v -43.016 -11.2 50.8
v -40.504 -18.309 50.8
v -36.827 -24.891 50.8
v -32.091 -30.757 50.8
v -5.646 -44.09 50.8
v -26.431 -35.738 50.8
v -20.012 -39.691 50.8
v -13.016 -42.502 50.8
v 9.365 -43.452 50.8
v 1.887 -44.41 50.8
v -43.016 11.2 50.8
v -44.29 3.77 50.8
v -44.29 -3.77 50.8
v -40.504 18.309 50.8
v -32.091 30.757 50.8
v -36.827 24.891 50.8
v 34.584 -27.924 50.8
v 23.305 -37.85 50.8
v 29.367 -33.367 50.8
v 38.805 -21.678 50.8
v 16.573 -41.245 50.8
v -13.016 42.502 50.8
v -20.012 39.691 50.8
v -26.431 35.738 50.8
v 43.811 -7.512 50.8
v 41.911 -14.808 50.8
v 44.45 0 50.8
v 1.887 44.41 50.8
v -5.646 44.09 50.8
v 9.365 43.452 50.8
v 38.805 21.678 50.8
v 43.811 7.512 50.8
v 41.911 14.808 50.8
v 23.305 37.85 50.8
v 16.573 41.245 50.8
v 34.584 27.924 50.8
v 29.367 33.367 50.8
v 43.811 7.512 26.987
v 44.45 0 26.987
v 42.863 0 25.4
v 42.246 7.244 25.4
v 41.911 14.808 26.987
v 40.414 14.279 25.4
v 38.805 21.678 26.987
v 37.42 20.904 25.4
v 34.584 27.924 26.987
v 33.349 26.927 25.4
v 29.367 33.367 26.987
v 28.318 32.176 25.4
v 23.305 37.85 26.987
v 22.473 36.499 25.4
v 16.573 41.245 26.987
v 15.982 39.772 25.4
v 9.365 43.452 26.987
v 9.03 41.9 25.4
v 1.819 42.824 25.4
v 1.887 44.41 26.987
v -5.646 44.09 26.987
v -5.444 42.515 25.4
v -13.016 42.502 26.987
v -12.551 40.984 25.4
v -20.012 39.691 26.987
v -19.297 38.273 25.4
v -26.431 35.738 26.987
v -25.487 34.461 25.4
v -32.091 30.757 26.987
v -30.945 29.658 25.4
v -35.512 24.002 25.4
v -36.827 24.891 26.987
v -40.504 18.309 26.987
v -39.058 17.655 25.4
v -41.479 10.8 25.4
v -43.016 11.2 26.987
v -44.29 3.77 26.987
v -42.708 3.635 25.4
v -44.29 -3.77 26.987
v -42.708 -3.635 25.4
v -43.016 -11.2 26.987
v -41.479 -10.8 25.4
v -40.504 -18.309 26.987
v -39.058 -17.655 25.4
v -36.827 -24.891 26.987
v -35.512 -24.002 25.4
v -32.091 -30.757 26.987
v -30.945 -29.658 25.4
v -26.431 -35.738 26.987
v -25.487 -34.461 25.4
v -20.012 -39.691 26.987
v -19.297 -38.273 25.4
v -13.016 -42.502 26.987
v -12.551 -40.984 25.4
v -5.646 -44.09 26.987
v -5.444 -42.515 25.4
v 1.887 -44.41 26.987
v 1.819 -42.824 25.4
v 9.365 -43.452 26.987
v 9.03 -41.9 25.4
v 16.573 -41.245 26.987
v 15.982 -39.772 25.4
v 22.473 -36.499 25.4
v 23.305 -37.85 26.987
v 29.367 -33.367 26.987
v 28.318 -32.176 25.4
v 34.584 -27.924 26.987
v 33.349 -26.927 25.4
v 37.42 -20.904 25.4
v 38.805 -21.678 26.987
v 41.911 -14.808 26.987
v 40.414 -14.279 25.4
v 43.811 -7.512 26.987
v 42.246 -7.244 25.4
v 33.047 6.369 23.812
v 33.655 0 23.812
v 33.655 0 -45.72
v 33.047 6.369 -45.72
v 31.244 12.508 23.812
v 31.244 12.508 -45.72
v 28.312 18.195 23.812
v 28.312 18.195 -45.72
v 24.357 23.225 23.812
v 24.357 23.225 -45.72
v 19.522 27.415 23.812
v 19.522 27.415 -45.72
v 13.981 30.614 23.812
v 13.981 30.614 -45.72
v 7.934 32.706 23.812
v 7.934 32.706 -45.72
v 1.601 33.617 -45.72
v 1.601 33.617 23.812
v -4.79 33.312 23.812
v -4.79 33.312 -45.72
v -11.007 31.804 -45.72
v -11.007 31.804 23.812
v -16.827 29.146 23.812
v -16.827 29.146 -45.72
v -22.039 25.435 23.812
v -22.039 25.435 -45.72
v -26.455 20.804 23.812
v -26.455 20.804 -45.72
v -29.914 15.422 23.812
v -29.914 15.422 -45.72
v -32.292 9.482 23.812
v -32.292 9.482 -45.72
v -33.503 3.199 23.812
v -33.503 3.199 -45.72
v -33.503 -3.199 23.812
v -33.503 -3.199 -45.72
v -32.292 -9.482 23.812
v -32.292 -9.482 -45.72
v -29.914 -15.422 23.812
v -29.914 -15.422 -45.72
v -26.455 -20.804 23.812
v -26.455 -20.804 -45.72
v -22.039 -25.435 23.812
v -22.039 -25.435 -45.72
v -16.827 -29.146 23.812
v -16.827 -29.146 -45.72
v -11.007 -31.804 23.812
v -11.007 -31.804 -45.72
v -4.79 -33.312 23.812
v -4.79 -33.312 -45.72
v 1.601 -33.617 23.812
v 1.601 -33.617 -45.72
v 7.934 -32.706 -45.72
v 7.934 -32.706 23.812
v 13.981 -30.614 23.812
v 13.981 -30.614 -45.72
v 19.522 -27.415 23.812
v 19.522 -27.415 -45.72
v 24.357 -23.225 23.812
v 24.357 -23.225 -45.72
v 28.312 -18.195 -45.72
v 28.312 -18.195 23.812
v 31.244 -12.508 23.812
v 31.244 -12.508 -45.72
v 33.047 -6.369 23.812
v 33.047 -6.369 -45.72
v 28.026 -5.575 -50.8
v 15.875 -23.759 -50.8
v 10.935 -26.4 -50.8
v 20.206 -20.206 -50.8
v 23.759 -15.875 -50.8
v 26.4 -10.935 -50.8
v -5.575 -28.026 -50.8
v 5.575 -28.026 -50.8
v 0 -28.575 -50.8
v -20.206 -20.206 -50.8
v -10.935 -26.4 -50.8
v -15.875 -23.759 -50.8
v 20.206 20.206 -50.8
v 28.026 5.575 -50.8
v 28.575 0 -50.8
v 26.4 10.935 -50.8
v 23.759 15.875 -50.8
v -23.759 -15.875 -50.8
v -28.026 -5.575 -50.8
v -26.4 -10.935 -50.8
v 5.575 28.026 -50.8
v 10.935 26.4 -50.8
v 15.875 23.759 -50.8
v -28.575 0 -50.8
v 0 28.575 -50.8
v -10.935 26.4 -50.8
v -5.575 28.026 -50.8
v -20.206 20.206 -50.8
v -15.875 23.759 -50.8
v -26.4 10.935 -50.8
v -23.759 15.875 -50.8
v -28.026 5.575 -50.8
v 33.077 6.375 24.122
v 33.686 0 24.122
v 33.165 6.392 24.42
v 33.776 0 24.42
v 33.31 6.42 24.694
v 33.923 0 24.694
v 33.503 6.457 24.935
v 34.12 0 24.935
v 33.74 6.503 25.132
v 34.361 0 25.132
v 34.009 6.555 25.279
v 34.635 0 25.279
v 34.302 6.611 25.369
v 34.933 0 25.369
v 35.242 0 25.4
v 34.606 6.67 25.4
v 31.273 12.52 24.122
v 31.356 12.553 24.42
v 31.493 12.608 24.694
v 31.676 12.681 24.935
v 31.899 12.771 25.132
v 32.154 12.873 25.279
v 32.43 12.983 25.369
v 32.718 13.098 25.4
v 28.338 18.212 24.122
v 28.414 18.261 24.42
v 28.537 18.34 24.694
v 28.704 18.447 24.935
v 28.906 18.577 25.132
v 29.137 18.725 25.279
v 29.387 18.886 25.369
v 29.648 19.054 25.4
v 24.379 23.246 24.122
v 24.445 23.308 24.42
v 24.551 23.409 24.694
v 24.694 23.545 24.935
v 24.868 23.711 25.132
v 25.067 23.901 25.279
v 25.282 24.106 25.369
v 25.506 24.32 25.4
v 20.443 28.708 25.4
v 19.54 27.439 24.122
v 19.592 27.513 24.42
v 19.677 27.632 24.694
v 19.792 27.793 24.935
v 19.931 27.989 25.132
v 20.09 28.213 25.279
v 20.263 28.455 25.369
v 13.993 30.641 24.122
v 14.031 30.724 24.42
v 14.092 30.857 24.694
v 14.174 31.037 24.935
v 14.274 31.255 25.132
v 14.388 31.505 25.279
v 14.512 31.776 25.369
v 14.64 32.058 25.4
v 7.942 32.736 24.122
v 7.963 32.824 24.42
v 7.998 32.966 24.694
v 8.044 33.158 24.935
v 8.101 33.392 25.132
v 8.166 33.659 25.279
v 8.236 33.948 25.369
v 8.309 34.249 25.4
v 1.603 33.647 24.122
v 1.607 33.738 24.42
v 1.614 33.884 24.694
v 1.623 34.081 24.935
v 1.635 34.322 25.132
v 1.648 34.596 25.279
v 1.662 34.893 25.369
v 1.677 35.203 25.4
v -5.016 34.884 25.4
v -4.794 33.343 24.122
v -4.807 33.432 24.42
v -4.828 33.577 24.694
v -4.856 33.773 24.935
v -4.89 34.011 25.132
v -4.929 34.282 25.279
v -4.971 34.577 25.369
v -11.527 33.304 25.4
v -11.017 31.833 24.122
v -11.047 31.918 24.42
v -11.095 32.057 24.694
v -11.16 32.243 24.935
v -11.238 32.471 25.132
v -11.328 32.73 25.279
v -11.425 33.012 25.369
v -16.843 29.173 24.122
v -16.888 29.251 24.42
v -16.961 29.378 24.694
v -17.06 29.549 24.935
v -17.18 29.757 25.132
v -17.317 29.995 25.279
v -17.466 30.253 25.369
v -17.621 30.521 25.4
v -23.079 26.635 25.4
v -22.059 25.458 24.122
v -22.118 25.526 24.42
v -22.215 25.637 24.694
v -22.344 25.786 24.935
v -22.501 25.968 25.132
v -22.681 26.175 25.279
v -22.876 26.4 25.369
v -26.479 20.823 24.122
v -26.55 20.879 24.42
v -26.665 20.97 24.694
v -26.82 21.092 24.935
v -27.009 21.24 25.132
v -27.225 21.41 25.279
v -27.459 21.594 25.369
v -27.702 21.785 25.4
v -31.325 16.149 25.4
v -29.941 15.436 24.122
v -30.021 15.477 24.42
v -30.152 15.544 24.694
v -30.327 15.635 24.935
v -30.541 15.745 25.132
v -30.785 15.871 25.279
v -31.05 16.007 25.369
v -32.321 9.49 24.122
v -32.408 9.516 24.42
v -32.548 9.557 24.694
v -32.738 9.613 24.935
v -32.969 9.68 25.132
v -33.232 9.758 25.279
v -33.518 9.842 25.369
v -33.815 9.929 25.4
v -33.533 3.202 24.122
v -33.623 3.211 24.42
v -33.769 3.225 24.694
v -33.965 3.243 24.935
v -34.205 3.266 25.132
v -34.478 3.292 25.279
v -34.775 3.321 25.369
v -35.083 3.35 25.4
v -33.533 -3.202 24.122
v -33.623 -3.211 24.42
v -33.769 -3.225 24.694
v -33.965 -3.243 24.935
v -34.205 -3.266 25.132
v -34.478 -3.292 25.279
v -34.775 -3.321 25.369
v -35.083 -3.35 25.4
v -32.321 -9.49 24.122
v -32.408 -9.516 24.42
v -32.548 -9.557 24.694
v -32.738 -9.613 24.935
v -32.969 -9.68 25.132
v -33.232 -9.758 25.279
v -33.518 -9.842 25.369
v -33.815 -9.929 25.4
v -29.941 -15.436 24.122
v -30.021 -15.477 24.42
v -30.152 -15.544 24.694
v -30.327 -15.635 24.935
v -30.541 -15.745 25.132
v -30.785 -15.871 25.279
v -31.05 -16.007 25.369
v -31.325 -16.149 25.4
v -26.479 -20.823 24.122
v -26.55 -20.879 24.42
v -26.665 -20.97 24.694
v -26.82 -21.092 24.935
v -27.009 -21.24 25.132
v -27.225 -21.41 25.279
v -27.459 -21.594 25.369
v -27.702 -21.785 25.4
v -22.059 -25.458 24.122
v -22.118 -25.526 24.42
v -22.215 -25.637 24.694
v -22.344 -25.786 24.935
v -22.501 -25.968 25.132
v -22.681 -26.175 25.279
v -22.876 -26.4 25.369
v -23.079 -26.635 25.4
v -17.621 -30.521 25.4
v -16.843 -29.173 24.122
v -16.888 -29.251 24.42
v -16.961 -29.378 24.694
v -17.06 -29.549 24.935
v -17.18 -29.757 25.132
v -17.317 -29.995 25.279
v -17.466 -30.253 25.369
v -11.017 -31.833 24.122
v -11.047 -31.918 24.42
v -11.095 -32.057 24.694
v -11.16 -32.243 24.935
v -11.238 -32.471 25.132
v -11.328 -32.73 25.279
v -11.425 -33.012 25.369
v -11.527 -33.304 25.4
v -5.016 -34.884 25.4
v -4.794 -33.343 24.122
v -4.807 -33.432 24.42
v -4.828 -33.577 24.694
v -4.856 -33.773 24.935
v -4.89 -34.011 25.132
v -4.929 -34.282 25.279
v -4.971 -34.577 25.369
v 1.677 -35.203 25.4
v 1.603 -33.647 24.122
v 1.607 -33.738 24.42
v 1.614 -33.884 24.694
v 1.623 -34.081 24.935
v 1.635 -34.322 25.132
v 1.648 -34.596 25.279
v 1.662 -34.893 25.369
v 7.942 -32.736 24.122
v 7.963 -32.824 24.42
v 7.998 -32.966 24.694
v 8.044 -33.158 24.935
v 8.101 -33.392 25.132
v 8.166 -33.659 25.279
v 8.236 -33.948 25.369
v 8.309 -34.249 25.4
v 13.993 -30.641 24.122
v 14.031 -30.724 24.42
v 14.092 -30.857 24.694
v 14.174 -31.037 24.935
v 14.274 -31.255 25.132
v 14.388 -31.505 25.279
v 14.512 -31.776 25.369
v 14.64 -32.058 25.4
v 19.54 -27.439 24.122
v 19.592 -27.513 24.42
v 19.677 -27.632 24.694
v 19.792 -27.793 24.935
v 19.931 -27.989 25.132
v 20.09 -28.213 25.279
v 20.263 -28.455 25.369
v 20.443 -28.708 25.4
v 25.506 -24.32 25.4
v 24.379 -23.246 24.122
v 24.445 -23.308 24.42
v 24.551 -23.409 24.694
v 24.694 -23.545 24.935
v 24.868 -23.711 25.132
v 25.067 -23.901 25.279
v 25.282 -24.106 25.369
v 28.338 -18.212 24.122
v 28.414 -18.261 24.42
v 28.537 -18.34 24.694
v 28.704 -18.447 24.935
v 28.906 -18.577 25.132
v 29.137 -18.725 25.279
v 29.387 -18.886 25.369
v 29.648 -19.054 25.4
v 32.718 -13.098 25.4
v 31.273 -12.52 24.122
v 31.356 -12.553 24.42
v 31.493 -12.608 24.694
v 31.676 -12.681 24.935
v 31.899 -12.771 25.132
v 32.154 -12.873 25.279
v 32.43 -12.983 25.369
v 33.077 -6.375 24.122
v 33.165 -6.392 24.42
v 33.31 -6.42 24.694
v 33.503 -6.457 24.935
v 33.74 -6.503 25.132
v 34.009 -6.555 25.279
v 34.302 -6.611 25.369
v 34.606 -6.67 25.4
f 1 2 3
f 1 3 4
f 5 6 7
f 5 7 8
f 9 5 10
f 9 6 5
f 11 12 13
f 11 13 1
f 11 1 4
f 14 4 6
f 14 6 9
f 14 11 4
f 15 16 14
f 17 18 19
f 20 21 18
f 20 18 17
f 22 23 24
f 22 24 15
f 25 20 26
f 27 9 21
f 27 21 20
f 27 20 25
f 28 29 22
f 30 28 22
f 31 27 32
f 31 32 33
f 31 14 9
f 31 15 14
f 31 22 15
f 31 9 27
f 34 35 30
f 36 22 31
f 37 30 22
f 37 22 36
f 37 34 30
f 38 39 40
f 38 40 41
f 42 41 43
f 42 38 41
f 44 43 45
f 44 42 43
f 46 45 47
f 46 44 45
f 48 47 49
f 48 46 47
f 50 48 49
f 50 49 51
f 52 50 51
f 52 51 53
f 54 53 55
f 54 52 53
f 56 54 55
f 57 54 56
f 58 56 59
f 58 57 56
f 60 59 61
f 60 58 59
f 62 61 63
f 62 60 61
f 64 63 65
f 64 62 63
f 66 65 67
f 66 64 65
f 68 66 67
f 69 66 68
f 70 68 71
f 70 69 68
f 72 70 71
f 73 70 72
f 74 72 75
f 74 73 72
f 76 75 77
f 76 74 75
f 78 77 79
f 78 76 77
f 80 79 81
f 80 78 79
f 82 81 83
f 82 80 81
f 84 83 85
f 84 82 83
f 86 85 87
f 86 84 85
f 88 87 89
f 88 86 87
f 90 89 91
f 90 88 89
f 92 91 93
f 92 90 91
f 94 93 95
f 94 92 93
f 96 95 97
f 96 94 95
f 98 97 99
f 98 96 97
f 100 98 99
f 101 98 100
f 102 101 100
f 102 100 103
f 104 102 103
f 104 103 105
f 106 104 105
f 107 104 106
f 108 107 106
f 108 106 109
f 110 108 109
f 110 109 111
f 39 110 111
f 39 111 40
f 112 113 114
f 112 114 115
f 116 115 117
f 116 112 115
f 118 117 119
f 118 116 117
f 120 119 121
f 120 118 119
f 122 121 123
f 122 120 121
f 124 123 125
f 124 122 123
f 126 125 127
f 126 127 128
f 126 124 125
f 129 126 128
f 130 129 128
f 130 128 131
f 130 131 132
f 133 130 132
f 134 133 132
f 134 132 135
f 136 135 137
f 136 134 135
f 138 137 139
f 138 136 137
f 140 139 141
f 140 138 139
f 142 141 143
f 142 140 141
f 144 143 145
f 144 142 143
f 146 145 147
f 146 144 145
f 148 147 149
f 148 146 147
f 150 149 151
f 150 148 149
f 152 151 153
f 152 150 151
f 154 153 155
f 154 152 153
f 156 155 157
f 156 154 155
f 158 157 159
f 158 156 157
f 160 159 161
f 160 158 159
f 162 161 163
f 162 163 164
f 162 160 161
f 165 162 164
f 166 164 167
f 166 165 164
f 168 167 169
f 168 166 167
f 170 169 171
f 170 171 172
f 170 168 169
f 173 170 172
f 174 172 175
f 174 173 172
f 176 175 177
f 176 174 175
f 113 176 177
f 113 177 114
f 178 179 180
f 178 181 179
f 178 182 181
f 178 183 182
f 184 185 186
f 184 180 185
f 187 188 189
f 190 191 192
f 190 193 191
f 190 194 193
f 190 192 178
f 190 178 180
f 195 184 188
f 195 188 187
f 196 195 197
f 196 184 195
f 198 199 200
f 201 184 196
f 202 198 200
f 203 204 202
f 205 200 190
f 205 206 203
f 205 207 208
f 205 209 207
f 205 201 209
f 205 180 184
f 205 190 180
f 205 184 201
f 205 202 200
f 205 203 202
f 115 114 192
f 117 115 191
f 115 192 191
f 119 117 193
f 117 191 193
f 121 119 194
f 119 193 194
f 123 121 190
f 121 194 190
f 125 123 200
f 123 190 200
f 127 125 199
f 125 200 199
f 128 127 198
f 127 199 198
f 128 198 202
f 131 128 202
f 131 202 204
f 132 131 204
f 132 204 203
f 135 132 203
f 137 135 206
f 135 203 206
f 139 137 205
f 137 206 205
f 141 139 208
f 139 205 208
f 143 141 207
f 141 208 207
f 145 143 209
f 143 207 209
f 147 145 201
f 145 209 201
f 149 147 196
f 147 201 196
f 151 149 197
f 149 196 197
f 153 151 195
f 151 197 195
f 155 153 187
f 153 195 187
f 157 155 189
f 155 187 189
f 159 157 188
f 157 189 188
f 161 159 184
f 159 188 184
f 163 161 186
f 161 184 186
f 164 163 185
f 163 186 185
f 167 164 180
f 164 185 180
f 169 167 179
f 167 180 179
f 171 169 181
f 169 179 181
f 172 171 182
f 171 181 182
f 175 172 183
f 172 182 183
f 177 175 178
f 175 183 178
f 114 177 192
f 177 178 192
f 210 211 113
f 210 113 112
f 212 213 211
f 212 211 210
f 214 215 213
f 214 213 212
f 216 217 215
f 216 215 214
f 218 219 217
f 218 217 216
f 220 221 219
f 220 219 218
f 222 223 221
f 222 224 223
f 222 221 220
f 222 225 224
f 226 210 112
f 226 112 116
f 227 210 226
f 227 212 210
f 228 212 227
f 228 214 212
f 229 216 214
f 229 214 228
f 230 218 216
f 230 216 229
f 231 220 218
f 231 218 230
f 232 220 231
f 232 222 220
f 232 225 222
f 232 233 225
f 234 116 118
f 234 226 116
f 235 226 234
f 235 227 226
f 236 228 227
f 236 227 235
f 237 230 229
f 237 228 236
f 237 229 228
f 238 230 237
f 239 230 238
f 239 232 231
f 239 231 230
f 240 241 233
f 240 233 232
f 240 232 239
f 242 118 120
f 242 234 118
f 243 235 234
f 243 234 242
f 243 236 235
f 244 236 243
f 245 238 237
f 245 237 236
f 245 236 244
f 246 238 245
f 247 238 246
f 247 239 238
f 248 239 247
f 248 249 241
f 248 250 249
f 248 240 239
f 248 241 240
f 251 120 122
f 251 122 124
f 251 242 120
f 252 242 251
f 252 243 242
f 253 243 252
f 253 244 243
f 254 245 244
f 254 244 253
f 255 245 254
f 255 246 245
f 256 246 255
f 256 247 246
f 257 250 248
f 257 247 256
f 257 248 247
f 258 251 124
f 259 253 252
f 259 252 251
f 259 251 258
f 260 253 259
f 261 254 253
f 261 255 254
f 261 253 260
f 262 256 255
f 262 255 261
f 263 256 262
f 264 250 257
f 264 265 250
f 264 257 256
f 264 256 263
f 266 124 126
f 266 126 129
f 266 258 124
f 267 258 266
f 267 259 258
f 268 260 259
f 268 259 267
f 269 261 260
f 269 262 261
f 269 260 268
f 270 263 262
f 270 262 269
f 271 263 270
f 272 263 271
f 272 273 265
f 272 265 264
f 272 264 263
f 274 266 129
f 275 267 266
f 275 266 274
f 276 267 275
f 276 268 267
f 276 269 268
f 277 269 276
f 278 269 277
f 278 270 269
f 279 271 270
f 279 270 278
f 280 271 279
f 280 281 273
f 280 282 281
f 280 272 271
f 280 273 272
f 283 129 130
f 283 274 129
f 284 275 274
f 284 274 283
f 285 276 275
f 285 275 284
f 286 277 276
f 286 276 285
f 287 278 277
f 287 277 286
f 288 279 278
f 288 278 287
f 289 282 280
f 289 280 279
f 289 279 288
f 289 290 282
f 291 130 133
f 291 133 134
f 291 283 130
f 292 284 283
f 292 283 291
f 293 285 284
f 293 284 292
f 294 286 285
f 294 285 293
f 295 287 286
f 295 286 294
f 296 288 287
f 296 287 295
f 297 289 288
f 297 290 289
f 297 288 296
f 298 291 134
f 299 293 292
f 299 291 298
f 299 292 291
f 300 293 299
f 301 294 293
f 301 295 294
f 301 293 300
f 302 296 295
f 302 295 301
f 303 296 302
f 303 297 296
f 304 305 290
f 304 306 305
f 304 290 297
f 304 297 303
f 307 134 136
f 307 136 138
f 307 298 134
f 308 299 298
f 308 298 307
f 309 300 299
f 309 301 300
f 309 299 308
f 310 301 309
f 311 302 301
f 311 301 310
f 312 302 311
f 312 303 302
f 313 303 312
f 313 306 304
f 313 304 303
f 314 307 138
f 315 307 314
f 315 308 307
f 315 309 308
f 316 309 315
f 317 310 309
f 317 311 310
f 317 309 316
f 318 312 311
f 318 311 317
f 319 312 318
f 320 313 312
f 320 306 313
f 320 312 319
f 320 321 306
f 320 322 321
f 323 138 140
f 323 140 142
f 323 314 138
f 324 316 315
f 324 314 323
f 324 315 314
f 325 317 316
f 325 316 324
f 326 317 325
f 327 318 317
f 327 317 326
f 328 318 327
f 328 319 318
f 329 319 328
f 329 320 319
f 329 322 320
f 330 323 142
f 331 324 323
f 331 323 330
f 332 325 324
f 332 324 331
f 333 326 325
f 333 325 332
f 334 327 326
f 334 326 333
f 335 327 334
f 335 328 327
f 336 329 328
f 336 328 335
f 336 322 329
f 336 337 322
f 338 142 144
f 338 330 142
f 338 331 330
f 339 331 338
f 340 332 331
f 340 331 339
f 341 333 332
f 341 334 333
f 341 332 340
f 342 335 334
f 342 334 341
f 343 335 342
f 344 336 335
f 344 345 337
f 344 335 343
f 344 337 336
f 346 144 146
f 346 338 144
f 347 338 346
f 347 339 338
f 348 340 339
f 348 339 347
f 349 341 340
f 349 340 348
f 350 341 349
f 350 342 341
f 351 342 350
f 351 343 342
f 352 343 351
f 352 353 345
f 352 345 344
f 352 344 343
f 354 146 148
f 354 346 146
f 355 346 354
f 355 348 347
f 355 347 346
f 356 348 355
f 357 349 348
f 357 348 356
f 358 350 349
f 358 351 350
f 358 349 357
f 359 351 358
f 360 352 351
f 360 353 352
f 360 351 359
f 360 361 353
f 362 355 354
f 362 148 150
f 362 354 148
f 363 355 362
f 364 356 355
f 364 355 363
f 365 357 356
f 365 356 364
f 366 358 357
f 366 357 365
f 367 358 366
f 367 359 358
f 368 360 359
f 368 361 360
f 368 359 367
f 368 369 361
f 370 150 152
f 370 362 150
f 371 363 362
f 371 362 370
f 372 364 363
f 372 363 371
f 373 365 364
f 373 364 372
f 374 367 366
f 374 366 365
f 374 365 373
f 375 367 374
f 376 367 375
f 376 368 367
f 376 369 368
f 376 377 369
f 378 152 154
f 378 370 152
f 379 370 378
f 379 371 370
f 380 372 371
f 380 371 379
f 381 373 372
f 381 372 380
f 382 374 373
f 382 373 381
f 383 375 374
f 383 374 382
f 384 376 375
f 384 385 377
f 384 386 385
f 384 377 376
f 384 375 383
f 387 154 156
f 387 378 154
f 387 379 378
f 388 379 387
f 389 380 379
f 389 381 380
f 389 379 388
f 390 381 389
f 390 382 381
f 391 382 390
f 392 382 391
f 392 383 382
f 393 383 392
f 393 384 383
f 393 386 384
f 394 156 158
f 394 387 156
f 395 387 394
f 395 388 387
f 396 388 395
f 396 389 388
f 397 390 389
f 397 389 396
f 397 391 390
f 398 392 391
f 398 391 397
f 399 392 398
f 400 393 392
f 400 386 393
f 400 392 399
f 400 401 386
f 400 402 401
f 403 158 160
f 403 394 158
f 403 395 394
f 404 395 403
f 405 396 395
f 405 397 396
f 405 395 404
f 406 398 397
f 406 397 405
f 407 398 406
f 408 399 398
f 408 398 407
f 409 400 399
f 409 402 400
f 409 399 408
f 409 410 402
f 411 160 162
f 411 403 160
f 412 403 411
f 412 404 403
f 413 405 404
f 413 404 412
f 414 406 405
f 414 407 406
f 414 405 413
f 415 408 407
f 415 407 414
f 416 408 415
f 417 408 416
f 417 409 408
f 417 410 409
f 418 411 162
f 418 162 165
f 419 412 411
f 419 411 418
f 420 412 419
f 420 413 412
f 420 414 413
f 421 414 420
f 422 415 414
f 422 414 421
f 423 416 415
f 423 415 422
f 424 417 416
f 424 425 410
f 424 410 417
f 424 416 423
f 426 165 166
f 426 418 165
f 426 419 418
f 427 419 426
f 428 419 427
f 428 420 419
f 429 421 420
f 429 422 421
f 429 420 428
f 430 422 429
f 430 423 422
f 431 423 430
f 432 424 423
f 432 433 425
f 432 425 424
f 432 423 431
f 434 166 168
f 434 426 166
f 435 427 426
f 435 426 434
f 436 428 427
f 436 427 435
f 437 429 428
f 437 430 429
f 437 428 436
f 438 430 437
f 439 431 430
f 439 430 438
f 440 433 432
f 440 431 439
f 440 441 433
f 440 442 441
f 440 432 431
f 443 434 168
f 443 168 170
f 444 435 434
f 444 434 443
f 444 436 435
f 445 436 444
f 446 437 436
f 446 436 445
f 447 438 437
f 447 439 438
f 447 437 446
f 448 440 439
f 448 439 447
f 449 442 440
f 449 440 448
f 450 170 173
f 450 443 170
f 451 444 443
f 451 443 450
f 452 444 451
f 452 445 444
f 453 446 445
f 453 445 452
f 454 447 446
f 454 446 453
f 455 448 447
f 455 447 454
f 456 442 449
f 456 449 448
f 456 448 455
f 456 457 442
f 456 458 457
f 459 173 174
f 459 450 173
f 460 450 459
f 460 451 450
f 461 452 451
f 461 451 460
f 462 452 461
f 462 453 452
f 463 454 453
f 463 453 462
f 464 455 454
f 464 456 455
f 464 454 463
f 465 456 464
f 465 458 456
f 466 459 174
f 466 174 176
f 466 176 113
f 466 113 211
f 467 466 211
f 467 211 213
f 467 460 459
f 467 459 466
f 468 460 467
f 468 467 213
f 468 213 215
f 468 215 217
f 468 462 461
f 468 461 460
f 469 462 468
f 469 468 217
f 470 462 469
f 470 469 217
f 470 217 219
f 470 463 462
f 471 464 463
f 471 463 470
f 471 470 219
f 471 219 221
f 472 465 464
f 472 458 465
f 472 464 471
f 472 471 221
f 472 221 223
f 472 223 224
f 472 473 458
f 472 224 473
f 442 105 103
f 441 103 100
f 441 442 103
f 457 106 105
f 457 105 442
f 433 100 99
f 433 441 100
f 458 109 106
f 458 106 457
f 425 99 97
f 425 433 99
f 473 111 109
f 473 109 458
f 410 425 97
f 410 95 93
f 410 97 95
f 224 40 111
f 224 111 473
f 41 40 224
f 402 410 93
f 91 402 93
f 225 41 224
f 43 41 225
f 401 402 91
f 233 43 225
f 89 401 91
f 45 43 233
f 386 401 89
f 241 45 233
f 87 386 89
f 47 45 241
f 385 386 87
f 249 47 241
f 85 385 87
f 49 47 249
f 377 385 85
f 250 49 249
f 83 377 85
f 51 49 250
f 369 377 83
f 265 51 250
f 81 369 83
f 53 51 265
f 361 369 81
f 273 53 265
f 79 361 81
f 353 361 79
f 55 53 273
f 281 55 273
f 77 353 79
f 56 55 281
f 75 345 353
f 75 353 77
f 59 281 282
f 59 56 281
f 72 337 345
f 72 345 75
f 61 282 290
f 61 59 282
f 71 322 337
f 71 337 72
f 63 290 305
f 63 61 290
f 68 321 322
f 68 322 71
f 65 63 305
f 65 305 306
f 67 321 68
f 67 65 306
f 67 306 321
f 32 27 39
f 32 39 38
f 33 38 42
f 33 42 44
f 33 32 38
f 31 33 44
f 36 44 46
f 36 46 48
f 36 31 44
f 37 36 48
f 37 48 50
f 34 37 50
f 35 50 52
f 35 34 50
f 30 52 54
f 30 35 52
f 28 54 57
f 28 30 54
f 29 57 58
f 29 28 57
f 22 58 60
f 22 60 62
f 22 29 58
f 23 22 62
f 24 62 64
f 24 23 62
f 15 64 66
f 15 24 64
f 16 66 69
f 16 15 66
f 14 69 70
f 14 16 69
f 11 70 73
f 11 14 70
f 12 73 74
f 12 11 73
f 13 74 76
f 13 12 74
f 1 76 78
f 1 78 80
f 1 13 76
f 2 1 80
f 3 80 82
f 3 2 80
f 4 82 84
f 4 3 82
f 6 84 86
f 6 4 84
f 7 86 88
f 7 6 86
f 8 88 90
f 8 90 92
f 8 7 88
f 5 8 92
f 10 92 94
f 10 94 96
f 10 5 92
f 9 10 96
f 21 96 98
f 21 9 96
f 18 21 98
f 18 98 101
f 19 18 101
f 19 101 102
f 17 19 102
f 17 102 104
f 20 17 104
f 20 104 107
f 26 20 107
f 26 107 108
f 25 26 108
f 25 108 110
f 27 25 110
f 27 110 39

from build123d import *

# Parameters (mm, degrees)
F2_R    = 1.5875
F3_SIZE = 1.5875
F4_SIZE = 5.08


with BuildPart() as f1:
    # F0 (on Front) → F1 (revolve)
    with BuildSketch(Plane.XZ):
        Polygon((0, 50.8), (0, -50.8), (33.655, -50.8), (33.655, 25.4), (44.45, 25.4), (44.45, 50.8), align=None)
    revolve(axis=Axis((0, 0, 0), (0, 0, 1)))

    # F2
    f2_edges = [f1.edges().sort_by_distance(p)[0] for p in [
        (-33.655, 0, 25.4),
    ]]
    fillet(f2_edges, radius=F2_R)

    # F3
    f3_edges = [f1.edges().sort_by_distance(p)[0] for p in [
        (-44.45, 0, 25.4),
    ]]
    chamfer(f3_edges, length=F3_SIZE)

    # F4
    f4_edges = [f1.edges().sort_by_distance(p)[0] for p in [
        (-33.655, 0, -50.8),
    ]]
    chamfer(f4_edges, length=F4_SIZE)


solid = f1.part
